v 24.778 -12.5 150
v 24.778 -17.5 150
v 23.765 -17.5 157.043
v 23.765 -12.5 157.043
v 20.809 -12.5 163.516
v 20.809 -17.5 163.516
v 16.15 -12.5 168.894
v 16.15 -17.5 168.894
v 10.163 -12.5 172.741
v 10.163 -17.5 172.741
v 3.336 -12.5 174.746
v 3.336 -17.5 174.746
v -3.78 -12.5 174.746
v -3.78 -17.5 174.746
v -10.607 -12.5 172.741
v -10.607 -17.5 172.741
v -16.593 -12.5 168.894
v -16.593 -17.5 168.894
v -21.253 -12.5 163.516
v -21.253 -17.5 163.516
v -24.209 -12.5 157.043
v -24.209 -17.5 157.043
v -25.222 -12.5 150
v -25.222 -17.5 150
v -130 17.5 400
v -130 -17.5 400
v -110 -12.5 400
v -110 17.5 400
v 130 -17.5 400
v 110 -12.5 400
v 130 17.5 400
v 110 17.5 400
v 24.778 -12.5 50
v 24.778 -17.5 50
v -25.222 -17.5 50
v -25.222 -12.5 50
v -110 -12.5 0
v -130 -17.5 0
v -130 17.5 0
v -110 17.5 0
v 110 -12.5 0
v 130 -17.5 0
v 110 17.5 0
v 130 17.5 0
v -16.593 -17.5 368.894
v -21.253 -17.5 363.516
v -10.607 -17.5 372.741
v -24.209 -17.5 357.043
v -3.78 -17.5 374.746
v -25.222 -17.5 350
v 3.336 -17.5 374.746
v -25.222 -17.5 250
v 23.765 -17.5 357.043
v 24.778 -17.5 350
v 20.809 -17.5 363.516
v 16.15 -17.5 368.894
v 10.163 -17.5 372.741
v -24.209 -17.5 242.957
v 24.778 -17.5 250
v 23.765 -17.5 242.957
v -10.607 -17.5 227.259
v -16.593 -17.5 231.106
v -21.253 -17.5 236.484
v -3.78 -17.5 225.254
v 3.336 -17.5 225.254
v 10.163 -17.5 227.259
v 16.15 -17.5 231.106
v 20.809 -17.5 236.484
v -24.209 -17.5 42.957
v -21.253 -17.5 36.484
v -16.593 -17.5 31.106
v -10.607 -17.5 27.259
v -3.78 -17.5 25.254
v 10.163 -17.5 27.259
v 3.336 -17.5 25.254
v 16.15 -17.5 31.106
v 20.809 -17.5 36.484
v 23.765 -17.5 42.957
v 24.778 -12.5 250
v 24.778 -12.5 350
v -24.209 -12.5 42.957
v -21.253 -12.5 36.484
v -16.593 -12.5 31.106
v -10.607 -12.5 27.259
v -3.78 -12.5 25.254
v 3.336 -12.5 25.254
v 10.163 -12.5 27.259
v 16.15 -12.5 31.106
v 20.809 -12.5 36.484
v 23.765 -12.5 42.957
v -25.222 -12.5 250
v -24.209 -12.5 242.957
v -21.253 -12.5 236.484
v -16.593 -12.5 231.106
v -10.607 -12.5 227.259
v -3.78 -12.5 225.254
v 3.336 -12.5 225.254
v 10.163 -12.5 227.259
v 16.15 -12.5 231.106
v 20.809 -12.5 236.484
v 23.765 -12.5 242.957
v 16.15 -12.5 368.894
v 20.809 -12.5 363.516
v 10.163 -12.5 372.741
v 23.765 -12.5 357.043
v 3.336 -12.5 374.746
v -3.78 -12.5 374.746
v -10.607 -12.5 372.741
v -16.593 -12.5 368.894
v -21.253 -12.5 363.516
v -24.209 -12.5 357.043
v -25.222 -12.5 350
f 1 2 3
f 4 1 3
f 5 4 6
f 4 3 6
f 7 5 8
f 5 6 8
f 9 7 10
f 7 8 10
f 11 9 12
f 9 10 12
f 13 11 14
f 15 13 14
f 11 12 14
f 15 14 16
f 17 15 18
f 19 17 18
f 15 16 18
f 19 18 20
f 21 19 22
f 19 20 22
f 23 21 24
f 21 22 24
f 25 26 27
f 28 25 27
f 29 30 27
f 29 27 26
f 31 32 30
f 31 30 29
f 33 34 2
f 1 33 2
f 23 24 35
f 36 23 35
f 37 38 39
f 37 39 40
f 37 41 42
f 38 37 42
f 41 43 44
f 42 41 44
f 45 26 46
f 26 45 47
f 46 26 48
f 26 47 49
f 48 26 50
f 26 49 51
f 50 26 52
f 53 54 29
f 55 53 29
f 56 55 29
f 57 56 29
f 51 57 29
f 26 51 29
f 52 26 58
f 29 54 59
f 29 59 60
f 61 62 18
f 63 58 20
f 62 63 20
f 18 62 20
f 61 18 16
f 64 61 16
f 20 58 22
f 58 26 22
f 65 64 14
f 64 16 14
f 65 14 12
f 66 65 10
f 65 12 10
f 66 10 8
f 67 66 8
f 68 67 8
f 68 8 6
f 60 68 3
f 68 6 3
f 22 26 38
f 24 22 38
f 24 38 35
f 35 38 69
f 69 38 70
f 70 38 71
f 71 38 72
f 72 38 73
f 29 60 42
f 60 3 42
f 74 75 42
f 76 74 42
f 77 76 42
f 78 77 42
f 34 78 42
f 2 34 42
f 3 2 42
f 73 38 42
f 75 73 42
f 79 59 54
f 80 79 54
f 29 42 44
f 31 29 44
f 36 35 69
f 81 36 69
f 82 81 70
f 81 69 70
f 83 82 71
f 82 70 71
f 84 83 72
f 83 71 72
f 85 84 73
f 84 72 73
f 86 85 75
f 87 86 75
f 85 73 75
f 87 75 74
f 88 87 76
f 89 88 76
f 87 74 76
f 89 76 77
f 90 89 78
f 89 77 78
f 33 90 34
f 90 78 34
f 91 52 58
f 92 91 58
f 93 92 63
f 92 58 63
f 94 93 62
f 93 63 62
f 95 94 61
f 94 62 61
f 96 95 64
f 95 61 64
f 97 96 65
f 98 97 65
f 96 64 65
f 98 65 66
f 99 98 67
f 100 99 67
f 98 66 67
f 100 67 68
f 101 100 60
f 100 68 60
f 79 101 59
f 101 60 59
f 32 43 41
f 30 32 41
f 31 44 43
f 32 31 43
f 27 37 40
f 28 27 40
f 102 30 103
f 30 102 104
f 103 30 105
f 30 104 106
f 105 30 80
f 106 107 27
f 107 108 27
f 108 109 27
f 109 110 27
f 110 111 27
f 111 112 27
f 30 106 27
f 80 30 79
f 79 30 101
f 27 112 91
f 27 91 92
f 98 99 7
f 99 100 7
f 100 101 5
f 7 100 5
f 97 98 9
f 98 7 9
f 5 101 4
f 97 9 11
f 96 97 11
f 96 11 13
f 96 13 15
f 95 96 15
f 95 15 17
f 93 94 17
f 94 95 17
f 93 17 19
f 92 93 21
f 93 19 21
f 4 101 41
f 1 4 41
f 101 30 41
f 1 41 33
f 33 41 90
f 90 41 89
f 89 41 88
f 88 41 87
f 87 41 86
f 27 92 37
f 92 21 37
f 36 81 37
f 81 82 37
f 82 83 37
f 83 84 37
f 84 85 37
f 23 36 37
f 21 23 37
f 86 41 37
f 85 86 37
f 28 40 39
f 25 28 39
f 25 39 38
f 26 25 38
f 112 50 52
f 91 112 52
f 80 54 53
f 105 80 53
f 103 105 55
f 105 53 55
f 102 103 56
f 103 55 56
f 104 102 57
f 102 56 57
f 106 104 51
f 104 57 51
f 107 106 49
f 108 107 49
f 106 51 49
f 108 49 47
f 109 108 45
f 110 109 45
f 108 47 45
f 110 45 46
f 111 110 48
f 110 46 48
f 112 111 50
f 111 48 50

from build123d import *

# Parameters (mm, degrees)
F1_DEPTH = 400
F3_DEPTH = 25


with BuildPart() as f1:
    # F0 (on Top) → F1 (new body)
    with BuildSketch(Plane.XY):
        Polygon((-130, 17.5), (-130, -17.5), (130, -17.5), (130, 17.5), (110, 17.5), (110, -12.5), (-110, -12.5), (-110, 17.5), align=None)
    extrude(amount=F1_DEPTH)

    # F2 (on face) → F3 (cut)
    with BuildSketch(Plane.XZ.offset(17.5)):
        with BuildLine():
            Line((-25.221969, 350), (-25.221969, 250))
            ThreePointArc((-25.221969, 250), (-0.221969, 225), (24.778031, 250))
            Line((24.778031, 250), (24.778031, 350))
            ThreePointArc((24.778031, 350), (-0.221969, 375), (-25.221969, 350))
        make_face()
        with BuildLine():
            Line((24.778031, 50), (24.778031, 150))
            ThreePointArc((24.778031, 150), (-0.221969, 175), (-25.221969, 150))
            Line((-25.221969, 150), (-25.221969, 50))
            ThreePointArc((-25.221969, 50), (-0.221969, 25), (24.778031, 50))
        make_face()
    extrude(amount=-F3_DEPTH, mode=Mode.SUBTRACT)


solid = f1.part
